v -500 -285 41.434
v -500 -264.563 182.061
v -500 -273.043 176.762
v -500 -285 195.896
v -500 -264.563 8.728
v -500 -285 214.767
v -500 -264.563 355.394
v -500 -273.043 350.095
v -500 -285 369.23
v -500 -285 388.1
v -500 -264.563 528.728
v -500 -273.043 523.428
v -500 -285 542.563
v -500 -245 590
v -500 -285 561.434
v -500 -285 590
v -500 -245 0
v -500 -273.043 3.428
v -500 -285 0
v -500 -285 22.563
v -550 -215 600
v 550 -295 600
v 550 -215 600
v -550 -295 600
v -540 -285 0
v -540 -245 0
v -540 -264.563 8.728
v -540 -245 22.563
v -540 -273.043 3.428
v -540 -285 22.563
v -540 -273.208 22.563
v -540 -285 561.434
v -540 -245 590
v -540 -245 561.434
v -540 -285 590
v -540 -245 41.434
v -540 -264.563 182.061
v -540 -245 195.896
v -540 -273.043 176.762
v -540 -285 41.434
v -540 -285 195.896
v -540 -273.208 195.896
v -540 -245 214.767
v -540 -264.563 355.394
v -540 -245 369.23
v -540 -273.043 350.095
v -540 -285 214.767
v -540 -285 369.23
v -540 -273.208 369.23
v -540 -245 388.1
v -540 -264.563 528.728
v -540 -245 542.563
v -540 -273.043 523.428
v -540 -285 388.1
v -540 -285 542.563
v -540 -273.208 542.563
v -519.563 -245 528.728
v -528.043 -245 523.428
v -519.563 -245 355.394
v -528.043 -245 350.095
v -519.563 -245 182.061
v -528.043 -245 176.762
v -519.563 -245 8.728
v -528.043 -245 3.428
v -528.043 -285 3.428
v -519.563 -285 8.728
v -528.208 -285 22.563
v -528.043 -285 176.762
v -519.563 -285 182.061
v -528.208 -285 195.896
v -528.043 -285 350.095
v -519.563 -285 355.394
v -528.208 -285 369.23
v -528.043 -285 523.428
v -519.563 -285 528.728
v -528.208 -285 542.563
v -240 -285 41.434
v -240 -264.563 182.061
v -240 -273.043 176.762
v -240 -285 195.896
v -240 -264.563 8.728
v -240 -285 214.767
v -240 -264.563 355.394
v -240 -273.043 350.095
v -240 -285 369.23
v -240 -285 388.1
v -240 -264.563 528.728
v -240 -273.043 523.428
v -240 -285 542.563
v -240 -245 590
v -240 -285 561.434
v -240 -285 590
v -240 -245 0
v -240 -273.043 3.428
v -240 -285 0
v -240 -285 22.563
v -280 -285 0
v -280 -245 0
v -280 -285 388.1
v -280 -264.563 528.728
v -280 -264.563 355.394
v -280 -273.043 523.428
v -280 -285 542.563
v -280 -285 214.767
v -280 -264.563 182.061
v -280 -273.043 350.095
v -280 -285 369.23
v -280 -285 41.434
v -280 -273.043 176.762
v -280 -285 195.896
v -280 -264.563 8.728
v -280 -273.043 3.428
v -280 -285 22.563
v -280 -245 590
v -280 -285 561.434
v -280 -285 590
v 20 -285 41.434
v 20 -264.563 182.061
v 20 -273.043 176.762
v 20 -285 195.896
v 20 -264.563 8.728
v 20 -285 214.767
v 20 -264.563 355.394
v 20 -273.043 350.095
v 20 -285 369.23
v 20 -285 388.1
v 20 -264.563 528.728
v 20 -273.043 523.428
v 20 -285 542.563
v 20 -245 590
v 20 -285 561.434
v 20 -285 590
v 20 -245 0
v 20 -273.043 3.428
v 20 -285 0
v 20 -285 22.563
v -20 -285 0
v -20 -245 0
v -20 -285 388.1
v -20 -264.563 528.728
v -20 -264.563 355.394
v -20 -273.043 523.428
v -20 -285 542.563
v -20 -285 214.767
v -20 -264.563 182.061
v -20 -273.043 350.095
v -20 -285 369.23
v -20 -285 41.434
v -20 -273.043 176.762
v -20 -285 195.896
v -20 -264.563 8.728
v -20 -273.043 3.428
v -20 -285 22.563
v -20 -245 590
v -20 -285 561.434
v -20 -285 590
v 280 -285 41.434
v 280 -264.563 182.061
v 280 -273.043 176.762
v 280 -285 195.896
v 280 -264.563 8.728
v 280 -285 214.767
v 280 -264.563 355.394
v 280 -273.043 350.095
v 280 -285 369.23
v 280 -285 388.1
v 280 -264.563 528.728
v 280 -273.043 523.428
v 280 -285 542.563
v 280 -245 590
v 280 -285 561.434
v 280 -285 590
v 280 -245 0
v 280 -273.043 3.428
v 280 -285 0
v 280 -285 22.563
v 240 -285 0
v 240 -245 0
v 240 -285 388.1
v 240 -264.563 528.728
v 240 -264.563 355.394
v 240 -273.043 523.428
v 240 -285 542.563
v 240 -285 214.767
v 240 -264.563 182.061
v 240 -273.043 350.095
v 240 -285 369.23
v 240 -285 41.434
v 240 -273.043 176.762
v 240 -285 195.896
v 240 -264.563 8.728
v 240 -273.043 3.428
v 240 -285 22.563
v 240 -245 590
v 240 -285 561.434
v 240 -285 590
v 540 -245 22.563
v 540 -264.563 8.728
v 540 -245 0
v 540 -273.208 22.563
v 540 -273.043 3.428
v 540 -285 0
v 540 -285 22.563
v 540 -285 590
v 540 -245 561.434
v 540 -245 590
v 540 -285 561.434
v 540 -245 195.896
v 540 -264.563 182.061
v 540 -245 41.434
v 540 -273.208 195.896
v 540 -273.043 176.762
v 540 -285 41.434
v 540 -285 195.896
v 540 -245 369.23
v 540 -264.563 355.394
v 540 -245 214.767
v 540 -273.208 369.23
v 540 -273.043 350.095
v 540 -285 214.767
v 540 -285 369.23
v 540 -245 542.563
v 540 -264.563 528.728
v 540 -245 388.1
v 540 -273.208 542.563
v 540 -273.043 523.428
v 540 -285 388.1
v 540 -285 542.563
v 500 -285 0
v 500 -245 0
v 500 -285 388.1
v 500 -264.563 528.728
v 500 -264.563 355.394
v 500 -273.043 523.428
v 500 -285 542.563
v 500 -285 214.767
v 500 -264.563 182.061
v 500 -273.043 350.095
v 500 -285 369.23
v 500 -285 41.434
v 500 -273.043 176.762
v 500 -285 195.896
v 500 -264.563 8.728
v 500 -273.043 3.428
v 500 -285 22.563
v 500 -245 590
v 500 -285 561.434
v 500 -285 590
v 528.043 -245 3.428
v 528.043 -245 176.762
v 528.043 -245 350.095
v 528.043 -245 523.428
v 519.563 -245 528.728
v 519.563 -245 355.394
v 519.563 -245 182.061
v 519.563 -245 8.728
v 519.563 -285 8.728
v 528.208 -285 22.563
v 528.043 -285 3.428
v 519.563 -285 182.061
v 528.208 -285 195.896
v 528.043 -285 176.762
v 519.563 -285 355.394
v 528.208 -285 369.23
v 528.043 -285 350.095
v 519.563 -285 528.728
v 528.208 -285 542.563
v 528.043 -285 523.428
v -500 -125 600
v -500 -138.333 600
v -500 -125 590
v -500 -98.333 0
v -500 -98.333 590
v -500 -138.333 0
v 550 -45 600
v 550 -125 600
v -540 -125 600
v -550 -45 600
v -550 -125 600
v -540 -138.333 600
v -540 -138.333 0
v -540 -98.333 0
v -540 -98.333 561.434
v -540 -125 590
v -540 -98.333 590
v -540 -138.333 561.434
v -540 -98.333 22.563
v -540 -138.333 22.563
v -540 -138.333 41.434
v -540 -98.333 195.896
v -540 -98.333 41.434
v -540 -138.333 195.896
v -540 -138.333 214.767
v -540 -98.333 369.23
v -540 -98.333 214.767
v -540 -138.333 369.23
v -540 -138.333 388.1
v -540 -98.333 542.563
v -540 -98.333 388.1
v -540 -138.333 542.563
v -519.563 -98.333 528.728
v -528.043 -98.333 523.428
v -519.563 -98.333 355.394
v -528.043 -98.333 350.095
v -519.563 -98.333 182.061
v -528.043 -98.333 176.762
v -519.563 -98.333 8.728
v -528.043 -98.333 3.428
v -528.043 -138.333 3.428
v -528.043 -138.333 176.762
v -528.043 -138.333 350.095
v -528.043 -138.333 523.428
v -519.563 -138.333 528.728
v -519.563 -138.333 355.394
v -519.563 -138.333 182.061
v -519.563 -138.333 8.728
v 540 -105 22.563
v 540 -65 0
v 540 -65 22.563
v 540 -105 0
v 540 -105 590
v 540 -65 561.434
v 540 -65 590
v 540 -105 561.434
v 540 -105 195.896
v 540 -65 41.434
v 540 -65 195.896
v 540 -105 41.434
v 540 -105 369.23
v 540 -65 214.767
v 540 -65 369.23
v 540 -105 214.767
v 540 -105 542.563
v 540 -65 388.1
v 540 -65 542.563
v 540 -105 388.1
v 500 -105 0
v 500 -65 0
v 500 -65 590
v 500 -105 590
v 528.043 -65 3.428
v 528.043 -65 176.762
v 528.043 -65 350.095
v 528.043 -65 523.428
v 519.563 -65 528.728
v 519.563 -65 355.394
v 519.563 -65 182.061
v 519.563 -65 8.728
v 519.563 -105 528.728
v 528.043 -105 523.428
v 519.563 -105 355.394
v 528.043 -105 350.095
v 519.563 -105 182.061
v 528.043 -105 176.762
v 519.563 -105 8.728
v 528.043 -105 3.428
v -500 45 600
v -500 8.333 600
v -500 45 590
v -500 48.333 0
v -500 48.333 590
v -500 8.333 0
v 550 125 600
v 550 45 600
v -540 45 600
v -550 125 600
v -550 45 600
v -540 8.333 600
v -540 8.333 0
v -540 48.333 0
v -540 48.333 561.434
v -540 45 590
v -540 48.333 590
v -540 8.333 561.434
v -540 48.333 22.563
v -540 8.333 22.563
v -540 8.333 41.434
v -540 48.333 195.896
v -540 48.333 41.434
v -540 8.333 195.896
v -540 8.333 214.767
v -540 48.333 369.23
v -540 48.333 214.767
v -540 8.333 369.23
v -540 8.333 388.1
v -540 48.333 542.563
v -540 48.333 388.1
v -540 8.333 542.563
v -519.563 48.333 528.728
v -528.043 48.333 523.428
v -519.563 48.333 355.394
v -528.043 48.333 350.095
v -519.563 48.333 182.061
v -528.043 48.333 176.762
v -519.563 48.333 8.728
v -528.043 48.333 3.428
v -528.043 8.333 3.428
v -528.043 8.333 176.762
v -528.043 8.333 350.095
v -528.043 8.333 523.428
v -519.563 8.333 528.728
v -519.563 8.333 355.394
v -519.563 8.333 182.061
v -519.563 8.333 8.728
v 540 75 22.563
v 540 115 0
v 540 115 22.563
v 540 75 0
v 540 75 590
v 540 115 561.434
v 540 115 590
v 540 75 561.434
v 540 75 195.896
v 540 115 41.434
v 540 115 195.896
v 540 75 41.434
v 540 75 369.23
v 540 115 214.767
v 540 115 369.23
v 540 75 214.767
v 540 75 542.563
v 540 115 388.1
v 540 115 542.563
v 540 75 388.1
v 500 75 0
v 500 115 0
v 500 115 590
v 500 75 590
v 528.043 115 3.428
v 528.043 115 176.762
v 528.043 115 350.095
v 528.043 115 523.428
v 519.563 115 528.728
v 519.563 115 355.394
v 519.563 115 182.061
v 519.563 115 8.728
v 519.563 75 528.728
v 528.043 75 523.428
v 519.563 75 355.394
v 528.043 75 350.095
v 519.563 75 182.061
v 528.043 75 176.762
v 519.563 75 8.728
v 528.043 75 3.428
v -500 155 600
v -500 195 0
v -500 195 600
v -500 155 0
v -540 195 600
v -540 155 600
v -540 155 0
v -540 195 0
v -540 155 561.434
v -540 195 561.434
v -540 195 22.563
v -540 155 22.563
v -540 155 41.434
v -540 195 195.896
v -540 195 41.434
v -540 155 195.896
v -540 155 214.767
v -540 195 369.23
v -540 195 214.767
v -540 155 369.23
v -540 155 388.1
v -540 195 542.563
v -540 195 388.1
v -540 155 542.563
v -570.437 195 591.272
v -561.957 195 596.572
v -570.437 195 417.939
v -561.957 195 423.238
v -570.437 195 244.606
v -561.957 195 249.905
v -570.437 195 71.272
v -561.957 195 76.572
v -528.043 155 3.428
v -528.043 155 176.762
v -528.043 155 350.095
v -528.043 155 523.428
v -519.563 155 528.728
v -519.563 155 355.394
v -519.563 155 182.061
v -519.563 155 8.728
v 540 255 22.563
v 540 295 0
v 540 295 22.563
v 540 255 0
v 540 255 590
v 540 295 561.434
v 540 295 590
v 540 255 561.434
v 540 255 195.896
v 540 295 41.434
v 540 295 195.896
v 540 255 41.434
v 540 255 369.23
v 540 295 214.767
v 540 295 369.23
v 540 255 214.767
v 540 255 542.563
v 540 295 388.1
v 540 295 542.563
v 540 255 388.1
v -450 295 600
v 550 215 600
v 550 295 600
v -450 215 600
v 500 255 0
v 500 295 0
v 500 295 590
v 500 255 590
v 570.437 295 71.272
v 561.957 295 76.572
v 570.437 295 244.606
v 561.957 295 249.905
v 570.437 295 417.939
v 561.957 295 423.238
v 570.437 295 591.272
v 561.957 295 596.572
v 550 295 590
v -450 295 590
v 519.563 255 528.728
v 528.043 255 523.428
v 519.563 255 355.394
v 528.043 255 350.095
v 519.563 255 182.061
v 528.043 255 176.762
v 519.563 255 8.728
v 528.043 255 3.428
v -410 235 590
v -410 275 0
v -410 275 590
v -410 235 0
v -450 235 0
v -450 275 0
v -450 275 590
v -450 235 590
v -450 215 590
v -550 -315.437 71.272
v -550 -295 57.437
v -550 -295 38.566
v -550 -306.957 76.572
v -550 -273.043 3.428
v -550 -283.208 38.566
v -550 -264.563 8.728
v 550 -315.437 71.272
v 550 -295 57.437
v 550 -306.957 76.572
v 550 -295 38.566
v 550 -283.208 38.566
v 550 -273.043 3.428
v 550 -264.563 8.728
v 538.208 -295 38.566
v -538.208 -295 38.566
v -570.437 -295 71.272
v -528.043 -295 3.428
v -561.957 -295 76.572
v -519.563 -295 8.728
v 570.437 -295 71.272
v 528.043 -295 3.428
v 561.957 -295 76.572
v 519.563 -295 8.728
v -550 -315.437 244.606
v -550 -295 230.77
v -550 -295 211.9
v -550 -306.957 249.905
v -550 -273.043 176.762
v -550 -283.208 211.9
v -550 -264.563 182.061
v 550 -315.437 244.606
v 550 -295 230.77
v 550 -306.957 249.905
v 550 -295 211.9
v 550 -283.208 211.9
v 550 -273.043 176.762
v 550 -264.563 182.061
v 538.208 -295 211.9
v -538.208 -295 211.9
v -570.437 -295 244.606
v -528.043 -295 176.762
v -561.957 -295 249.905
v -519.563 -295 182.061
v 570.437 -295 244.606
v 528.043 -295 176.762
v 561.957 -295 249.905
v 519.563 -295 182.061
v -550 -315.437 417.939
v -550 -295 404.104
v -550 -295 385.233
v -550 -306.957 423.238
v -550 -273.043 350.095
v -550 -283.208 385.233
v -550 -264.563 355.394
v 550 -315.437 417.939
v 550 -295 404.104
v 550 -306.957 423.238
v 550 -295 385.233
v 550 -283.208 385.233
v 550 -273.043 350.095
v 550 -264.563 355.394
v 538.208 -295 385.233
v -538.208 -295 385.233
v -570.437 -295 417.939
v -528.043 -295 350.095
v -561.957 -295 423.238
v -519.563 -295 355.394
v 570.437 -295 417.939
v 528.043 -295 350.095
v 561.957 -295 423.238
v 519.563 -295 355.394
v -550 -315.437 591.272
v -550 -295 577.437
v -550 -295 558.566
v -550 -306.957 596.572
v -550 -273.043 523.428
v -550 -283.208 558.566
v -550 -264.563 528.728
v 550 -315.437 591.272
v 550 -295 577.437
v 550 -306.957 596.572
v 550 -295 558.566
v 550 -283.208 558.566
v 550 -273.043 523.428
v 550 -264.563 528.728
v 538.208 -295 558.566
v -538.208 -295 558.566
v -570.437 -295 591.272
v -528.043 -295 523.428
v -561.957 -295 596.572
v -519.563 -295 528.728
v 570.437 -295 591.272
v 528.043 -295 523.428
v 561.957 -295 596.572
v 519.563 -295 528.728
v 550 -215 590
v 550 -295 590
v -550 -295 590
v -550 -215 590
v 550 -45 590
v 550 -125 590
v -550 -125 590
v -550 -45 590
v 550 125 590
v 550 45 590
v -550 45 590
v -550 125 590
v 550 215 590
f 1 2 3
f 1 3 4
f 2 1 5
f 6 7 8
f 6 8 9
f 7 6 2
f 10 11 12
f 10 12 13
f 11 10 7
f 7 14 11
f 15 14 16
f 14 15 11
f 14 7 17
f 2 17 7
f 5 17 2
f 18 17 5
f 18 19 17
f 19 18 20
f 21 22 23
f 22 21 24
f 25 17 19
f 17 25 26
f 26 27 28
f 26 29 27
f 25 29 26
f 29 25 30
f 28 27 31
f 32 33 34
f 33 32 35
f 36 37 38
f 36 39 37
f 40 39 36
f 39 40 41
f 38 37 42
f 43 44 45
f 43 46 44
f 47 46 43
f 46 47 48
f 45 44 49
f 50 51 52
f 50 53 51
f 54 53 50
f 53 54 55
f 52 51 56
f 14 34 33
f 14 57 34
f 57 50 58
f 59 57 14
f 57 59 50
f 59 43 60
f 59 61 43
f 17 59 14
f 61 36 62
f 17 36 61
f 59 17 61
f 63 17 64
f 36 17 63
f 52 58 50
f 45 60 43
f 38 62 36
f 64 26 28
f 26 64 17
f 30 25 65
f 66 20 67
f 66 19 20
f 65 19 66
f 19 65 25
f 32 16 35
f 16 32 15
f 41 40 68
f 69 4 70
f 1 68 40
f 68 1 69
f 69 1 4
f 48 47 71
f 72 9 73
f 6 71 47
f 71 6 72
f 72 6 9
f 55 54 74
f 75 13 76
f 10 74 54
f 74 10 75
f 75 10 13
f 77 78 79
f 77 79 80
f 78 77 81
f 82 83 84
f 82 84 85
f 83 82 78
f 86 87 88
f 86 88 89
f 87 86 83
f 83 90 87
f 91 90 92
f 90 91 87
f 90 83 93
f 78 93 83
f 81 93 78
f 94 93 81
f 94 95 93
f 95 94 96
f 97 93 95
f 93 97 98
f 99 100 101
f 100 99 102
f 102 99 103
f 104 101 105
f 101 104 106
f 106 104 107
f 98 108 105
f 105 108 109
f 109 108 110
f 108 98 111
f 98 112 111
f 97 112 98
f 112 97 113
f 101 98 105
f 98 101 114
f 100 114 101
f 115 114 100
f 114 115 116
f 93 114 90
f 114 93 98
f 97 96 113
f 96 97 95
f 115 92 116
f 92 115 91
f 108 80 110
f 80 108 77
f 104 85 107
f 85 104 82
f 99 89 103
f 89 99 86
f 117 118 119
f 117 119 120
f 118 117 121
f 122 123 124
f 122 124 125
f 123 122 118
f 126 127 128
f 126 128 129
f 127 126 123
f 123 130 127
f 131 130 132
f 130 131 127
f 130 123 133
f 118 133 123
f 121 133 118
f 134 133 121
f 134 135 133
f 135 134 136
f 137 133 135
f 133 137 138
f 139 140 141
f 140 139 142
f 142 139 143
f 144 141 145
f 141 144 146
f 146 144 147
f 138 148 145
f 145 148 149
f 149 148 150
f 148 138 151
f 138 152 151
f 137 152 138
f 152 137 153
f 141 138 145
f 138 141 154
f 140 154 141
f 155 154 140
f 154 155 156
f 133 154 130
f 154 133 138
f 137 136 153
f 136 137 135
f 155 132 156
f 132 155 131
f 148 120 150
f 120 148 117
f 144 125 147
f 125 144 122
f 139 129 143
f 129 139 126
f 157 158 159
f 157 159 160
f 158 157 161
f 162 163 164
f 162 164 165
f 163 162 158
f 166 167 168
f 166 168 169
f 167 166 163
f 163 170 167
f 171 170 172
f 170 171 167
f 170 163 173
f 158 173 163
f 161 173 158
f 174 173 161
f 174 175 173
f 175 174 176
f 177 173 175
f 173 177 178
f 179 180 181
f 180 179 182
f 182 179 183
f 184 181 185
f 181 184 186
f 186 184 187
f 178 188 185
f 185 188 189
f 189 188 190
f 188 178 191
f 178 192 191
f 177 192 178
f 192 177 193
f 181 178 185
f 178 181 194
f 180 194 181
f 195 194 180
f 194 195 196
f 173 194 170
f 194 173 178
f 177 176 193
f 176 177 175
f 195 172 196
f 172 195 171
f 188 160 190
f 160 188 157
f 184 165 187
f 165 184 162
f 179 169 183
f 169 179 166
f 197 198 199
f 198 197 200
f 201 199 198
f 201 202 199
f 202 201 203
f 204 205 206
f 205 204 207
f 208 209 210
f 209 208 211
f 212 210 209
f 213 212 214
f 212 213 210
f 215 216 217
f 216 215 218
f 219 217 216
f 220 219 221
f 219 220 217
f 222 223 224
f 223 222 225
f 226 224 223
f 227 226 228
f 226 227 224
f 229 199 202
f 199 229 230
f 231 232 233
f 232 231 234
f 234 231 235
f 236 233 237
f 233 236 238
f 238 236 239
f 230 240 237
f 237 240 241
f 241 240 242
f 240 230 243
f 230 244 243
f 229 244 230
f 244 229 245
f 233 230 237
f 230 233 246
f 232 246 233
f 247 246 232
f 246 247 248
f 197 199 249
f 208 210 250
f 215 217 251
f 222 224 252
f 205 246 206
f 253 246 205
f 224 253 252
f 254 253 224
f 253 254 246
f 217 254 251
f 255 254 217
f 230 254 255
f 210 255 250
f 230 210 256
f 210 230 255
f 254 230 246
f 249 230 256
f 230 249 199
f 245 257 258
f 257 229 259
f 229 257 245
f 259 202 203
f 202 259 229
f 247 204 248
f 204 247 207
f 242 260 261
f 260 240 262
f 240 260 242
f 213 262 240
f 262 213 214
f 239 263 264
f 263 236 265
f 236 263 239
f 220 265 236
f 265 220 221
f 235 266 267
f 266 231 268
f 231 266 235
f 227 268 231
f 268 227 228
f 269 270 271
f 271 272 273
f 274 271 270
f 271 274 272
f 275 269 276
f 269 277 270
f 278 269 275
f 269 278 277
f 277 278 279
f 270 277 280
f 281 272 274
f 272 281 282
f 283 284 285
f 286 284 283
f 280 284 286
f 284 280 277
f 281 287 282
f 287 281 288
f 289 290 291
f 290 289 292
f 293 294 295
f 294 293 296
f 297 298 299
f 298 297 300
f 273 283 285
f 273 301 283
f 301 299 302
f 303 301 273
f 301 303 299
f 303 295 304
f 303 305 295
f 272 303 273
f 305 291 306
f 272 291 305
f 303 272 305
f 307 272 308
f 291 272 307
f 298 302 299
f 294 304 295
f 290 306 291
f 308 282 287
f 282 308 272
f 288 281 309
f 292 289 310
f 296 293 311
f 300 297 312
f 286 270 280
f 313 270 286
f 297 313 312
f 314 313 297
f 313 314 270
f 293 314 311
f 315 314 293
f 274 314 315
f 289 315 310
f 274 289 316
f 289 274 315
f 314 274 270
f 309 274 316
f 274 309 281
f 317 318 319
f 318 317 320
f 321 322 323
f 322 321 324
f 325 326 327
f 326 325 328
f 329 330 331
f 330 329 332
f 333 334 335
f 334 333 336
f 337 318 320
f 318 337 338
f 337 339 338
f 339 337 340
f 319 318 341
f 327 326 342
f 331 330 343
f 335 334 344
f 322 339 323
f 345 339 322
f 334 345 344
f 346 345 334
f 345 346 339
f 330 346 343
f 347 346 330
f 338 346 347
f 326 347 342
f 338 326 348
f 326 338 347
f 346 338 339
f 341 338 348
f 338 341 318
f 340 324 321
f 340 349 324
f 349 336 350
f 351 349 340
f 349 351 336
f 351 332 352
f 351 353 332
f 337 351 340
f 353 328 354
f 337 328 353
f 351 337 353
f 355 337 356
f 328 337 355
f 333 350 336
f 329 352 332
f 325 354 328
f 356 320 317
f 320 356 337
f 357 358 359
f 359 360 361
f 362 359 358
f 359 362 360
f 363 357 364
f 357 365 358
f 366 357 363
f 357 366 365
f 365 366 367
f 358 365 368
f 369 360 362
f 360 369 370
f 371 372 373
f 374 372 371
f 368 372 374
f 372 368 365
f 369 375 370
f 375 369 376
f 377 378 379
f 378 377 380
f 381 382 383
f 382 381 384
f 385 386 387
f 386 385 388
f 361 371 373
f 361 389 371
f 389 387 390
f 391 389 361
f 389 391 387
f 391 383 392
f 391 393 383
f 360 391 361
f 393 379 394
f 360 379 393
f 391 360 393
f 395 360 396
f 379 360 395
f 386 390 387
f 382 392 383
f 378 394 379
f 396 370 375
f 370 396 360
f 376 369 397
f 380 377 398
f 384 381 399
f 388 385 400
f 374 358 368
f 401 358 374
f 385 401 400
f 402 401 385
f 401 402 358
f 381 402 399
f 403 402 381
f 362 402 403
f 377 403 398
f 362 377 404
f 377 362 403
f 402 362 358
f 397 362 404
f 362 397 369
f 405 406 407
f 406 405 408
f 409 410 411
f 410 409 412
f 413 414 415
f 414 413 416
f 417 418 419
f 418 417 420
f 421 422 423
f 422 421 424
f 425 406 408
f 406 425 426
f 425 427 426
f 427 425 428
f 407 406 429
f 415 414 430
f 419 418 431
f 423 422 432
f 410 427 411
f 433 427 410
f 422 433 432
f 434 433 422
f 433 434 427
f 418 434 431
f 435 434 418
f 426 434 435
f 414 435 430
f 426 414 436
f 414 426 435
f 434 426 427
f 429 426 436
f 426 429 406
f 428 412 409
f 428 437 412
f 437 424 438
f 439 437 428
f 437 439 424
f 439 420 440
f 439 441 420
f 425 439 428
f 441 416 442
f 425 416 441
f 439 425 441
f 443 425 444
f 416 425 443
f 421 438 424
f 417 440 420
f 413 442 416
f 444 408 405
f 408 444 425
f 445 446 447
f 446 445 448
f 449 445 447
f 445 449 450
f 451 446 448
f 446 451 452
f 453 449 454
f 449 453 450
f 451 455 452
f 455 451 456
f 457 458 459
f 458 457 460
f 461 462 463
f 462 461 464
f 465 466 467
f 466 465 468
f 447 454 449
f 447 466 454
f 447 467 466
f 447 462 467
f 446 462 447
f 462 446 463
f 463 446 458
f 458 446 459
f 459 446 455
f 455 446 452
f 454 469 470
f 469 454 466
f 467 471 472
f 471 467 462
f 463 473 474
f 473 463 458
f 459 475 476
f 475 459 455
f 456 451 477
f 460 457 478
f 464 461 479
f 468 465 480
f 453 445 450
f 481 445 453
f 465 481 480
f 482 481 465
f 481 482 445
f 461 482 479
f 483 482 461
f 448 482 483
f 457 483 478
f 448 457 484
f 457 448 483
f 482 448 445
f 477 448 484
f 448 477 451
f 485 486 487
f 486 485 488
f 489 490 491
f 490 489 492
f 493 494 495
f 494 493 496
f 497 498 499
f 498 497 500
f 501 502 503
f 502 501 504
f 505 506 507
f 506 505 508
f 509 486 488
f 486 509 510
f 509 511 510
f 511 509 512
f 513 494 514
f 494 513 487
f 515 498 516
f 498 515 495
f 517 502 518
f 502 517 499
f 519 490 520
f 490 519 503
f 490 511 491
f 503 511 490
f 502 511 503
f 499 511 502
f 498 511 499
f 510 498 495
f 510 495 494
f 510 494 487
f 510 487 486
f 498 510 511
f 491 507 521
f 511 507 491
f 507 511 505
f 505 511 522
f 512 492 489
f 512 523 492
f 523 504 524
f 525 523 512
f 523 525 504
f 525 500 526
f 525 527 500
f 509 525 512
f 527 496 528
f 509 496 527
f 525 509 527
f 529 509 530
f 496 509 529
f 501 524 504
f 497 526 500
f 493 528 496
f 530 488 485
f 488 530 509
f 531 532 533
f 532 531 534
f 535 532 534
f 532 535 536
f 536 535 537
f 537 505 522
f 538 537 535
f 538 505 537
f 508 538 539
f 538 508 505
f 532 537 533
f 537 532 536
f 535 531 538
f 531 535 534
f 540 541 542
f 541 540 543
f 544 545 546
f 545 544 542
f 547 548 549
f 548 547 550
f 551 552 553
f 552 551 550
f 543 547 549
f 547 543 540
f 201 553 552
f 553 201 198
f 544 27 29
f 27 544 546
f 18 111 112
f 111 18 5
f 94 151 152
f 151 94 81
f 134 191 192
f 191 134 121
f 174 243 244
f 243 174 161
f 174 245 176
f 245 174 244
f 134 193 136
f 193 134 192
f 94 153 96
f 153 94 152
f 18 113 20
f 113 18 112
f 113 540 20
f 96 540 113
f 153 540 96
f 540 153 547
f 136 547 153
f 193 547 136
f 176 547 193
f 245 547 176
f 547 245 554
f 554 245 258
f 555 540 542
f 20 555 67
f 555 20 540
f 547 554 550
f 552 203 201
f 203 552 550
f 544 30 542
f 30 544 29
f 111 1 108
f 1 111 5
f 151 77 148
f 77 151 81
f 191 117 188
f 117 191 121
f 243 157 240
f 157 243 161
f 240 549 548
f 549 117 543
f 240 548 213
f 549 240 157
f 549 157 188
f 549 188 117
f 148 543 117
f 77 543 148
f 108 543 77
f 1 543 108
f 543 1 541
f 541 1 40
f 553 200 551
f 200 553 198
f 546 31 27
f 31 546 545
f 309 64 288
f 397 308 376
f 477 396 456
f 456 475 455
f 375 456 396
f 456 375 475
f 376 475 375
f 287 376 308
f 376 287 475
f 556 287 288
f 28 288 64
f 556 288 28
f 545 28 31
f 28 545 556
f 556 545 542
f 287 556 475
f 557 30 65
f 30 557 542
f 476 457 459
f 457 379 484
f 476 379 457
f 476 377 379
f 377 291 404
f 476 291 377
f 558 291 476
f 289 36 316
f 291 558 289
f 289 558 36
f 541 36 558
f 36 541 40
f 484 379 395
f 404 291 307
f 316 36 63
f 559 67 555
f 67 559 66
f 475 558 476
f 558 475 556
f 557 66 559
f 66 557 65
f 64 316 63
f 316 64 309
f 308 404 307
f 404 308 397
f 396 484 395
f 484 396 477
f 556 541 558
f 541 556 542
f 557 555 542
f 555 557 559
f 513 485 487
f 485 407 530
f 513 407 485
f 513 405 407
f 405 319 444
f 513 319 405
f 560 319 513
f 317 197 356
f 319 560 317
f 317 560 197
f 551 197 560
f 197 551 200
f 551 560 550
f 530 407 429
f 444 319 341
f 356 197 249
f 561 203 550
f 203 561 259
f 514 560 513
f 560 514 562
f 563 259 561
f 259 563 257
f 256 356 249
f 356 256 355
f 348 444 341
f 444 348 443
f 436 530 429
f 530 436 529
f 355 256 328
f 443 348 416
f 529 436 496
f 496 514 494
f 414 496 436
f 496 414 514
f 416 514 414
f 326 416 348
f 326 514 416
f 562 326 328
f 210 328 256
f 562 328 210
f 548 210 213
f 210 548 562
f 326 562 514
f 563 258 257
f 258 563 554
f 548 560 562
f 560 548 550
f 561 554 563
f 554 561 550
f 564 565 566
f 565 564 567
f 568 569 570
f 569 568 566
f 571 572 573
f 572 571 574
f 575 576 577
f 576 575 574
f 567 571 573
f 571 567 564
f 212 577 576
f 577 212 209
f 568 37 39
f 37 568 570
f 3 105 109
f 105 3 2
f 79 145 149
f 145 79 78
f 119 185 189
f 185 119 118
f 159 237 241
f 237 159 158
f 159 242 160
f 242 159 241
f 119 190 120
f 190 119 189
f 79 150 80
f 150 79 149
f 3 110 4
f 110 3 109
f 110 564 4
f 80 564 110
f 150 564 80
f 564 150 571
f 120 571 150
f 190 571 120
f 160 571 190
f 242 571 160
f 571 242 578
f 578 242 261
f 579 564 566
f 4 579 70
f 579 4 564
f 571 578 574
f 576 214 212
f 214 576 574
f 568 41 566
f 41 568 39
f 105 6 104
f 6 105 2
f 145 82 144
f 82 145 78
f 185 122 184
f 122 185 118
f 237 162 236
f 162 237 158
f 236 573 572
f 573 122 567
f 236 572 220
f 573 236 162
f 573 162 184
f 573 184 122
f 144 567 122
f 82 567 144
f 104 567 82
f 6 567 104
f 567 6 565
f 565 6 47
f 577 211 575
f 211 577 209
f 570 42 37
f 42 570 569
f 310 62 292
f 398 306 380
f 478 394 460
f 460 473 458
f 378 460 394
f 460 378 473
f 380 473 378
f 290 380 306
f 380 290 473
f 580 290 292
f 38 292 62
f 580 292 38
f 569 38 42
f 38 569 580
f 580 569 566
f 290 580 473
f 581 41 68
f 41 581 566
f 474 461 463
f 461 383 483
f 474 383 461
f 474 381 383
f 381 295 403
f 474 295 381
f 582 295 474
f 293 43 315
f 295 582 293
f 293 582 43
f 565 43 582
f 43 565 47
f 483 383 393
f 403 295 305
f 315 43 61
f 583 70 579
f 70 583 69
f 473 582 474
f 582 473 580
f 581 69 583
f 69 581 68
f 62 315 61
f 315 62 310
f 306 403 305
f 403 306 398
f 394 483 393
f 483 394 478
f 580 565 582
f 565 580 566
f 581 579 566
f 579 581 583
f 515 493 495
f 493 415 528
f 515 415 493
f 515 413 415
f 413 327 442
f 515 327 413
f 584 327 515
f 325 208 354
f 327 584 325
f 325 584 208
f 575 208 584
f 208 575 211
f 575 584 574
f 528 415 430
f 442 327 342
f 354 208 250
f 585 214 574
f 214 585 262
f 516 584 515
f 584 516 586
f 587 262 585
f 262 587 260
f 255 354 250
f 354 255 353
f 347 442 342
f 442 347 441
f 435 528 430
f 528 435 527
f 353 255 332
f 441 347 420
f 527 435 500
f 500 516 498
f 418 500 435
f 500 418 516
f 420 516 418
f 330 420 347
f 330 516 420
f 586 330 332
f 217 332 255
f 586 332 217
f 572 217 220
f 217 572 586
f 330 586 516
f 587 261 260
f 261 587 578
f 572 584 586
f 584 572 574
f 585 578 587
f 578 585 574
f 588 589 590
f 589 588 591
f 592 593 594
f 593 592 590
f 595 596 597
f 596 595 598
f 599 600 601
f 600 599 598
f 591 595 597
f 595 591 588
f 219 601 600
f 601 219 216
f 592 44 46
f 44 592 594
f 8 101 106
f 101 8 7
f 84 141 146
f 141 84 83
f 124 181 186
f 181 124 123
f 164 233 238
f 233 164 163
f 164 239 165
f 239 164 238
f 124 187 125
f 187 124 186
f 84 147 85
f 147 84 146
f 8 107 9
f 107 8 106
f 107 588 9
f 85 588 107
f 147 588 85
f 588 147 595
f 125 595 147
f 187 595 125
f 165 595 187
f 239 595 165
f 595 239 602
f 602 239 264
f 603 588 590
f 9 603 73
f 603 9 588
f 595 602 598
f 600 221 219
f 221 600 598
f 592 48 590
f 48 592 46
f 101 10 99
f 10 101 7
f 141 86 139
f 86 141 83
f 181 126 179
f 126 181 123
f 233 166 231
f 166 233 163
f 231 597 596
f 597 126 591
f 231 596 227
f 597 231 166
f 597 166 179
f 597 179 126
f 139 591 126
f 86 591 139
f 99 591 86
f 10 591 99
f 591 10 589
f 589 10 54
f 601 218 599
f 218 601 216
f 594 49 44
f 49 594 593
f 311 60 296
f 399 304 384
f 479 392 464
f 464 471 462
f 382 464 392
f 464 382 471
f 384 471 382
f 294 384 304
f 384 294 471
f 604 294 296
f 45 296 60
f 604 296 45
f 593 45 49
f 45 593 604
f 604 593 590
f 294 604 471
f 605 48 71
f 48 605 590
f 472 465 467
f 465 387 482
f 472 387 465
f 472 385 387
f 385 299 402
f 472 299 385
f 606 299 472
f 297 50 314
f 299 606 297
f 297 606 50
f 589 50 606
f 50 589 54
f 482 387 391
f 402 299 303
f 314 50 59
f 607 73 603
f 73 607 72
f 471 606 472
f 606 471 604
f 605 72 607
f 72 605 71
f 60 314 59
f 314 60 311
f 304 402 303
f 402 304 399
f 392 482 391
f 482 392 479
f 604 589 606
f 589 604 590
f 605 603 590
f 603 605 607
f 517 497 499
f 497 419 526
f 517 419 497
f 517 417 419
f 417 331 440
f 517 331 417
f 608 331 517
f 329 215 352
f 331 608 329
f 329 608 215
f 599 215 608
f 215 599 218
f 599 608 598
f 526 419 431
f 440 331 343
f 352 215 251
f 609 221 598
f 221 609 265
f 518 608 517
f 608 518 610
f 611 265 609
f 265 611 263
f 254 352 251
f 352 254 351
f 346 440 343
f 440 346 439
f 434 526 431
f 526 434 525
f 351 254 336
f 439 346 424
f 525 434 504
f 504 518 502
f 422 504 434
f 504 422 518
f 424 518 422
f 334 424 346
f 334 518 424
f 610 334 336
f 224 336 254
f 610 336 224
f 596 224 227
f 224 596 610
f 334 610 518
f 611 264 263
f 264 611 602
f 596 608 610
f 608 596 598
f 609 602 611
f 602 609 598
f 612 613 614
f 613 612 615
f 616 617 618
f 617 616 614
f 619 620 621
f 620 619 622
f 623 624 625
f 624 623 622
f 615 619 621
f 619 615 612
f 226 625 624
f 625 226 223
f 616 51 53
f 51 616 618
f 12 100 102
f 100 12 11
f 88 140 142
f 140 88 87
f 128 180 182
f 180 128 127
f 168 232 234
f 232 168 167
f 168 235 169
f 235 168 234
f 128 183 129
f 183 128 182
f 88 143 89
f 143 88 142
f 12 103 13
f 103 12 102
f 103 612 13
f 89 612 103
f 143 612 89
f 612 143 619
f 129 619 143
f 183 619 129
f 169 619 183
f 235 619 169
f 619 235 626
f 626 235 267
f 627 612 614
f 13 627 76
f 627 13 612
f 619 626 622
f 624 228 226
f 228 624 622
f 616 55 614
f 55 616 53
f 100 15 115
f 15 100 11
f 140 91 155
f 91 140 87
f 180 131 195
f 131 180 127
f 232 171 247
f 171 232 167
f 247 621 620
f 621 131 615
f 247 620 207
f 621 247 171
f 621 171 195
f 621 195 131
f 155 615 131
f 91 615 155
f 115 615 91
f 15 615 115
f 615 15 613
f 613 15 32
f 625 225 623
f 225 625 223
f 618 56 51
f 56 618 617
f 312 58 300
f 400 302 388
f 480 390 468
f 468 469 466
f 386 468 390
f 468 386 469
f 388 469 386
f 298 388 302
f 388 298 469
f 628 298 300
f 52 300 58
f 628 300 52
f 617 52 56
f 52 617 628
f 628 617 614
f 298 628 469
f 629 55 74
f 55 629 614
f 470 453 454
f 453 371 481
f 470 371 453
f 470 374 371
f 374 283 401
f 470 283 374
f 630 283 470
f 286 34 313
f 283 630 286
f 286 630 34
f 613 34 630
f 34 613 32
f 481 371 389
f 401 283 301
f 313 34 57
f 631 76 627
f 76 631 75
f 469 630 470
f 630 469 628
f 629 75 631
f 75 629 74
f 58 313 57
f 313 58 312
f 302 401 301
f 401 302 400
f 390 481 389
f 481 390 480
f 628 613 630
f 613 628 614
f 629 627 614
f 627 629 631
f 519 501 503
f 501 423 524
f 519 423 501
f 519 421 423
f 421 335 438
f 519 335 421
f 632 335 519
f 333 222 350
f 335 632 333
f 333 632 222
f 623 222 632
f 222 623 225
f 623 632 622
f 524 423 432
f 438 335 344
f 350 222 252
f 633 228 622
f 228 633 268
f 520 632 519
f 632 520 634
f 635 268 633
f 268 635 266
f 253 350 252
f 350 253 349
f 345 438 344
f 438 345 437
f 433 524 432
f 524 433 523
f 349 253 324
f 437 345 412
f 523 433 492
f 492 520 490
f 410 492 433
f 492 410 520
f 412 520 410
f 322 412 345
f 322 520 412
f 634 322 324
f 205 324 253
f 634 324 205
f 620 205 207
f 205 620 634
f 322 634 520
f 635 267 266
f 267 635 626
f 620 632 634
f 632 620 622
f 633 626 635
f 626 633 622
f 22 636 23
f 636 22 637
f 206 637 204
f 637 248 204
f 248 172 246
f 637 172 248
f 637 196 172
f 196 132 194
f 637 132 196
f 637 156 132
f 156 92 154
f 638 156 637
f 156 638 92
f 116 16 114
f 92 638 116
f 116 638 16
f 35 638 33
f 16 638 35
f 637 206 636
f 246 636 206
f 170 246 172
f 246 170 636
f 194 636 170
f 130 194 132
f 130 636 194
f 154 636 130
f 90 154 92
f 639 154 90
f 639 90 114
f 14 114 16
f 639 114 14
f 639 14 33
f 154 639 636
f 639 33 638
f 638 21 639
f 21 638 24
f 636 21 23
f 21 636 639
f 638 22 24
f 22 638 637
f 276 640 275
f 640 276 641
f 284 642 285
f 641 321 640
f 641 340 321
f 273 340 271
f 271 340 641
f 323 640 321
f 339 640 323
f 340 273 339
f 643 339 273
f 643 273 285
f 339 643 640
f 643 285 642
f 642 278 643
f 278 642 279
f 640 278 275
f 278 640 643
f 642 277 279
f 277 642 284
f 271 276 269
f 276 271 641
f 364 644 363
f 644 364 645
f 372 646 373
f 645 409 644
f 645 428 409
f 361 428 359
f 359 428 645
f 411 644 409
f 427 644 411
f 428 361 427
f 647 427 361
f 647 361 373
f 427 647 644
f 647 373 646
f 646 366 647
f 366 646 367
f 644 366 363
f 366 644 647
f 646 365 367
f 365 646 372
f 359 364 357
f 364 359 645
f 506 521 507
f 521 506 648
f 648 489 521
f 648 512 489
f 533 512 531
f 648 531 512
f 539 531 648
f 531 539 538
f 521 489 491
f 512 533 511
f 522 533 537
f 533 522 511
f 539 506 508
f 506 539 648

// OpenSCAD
/*
  Alternative 2: louvered airflow AC cover.

  Same clear internal footprint inside battens:
    1000 mm wide x 500 mm deep x 600 mm high

  Design intent:
    - Open back and bottom.
    - Angled front and side louvers for better airflow than flat slats.
    - Top remains flat slatted cover.
    - Same asymmetric left side depth from the final design.
*/

$fn = 24;

clear_width_inside_battens = 1000;
clear_depth_inside_battens = 500;
box_height = 600;

panel_thickness = 10;
louver_width = 80;
batten_size = 40;
left_side_depth = 490;
louver_angle = 32;

box_width = clear_width_inside_battens + (2 * panel_thickness) + (2 * batten_size);
box_depth = clear_depth_inside_battens + panel_thickness + (2 * batten_size);

louver_count = 4;
top_slat_count = 4;

front_gap = (box_height - (louver_count * louver_width)) / (louver_count - 1);
top_gap = (box_depth - (top_slat_count * louver_width)) / (top_slat_count - 1);

rear_top_shorten = 100;

wood_color = [0.72, 0.45, 0.24];
batten_color = [0.55, 0.31, 0.16];

module part(size, position, color_value = wood_color) {
  color(color_value)
    translate(position)
      cube(size, center = true);
}

module batten(position) {
  part([batten_size, batten_size, box_height], position, batten_color);
}

module front_louver(z) {
  translate([0, -box_depth / 2 + panel_thickness / 2, z])
    rotate([louver_angle, 0, 0])
      part([box_width, panel_thickness, louver_width], [0, 0, 0]);
}

module side_louver(x, y_center, z, depth) {
  translate([x, y_center, z])
    rotate([0, x < 0 ? -louver_angle : louver_angle, 0])
      part([panel_thickness, depth, louver_width], [0, 0, 0]);
}

module battens() {
  front_y = -box_depth / 2 + panel_thickness + batten_size / 2;
  rear_y = box_depth / 2 - batten_size / 2;
  left_rear_y = -box_depth / 2 + left_side_depth - batten_size / 2;
  left_x = -box_width / 2 + panel_thickness + batten_size / 2;
  right_x = box_width / 2 - panel_thickness - batten_size / 2;

  for (i = [0 : 4]) {
    x = left_x + i * ((right_x - left_x) / 4);
    batten([x, front_y, box_height / 2]);
  }

  for (i = [1 : 3]) {
    batten([left_x, front_y + i * ((left_rear_y - front_y) / 3), box_height / 2]);
    batten([right_x, front_y + i * ((rear_y - front_y) / 3), box_height / 2]);
  }

  rear_top_y = -box_depth / 2 + louver_width / 2 + (top_slat_count - 1) * (louver_width + top_gap);
  rear_top_left_edge_x = -box_width / 2 + rear_top_shorten;
  batten([rear_top_left_edge_x + batten_size / 2, rear_top_y, box_height / 2]);
}

module louvered_cover() {
  battens();

  for (i = [0 : louver_count - 1]) {
    z = louver_width / 2 + i * (louver_width + front_gap);
    front_louver(z);
    side_louver(-box_width / 2 + panel_thickness / 2, -box_depth / 2 + left_side_depth / 2, z, left_side_depth);
    side_louver(box_width / 2 - panel_thickness / 2, 0, z, box_depth);
  }

  for (i = [0 : top_slat_count - 1]) {
    y = -box_depth / 2 + louver_width / 2 + i * (louver_width + top_gap);
    top_length = i == top_slat_count - 1 ? box_width - rear_top_shorten : box_width;
    top_x = i == top_slat_count - 1 ? rear_top_shorten / 2 : 0;
    part([top_length, louver_width, panel_thickness], [top_x, y, box_height - panel_thickness / 2]);
  }
}

louvered_cover();

/*
  Approximate cut list:
    Front louvers: 4 x 1100 x 80 x 10 mm
    Left side louvers: 4 x 490 x 80 x 10 mm
    Right side louvers: 4 x 590 x 80 x 10 mm
    Top slats: 3 x 1100 x 80 x 10 mm
    Rear top slat: 1 x 1000 x 80 x 10 mm
    Battens: 12 x 40 x 40 x 600 mm
*/
